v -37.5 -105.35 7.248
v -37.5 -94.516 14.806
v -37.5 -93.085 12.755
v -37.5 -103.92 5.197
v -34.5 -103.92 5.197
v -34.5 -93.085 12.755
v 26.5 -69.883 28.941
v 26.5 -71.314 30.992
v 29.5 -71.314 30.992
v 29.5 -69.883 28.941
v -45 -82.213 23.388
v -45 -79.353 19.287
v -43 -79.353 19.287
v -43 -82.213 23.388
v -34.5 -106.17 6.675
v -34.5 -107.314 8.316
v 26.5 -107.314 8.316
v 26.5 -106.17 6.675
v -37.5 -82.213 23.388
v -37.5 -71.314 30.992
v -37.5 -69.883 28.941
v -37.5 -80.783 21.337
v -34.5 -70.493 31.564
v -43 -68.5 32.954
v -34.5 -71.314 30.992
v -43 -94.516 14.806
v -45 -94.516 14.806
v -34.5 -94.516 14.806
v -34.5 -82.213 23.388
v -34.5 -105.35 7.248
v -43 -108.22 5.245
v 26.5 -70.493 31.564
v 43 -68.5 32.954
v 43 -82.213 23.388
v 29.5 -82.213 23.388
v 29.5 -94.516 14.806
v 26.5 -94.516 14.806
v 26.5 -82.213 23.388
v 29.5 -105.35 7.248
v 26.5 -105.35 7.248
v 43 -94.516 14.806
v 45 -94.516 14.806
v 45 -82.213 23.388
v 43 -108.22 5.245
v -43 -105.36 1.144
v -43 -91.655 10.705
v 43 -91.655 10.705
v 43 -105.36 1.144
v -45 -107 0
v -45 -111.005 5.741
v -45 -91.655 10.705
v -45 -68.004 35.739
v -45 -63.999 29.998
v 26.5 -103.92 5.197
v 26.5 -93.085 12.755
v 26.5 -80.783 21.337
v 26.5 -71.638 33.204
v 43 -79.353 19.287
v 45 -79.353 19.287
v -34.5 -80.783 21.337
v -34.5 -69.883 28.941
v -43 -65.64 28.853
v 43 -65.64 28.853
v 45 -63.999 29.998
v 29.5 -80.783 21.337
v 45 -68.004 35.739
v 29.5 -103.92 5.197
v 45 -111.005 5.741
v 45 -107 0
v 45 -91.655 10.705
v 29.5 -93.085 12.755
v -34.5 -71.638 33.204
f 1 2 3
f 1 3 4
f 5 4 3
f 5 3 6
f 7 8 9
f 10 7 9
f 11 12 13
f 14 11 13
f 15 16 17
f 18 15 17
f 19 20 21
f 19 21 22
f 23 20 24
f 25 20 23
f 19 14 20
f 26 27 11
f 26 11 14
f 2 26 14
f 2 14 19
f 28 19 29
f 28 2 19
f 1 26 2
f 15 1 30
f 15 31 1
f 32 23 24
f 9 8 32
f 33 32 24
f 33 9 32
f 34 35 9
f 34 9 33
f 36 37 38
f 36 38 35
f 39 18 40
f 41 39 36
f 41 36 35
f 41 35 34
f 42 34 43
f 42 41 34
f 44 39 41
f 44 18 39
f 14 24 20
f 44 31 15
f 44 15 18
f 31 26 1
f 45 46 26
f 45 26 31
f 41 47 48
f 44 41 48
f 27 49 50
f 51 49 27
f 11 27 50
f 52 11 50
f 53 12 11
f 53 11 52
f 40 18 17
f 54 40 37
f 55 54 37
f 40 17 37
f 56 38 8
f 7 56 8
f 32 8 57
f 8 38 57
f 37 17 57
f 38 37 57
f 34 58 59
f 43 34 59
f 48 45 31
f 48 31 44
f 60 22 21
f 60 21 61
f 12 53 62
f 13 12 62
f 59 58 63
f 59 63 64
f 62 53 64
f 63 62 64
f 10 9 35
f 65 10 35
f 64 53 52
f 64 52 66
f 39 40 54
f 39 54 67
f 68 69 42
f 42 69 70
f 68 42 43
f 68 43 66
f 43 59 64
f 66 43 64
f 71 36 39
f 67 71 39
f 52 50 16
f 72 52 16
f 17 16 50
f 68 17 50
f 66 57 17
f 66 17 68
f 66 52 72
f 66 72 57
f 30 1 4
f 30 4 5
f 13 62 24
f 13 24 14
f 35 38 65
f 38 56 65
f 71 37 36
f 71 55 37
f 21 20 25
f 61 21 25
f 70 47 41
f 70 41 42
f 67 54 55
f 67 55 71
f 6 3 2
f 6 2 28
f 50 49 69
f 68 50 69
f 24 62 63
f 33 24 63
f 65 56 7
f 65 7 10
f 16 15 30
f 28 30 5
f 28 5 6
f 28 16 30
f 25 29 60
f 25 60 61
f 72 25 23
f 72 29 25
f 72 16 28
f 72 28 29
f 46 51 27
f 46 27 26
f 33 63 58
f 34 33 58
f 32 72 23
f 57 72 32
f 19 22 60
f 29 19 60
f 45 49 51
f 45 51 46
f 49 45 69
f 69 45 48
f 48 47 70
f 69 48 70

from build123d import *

# Parameters (mm, degrees)
SKETCH019_W             = 90
SKETCH019_H             = 52.43
PAD008_DEPTH            = 7
SKETCH020_W             = 86
SKETCH020_H             = 48.43
POCKET010_DEPTH         = 5
SKETCH030_W             = 67
SKETCH030_H             = 41.5
PAD011_DEPTH            = 2.5
SKETCH021_W             = 61
SKETCH021_H             = 43.5
POCKET011_DEPTH         = 7.001
SKETCH029_W             = 90
SKETCH029_H             = 15
POCKET016_DEPTH         = 5
BODY001_PLACEMENT_ANGLE = 34.9


with BuildPart() as part:
    # Sketch019 → Pad008 (new body)
    with BuildSketch(Plane.XY):
        with Locations((0, 26.215)):
            Rectangle(SKETCH019_W, SKETCH019_H)
    extrude(amount=PAD008_DEPTH)

    # Sketch020 (on Face5 of Pad008) → Pocket010 (cut)
    with BuildSketch(Plane(origin=(0, 0, 0), x_dir=(1, 0, 0), z_dir=(0, 0, -1))):
        with Locations((0, -26.215)):
            Rectangle(SKETCH020_W, SKETCH020_H)
    extrude(amount=-POCKET010_DEPTH, mode=Mode.SUBTRACT)

    # Sketch030 (on Face11 of Pocket010) → Pad011 (join)
    with BuildSketch(Plane(origin=(0, 0, 5), x_dir=(1, 0, 0), z_dir=(0, 0, -1))):
        with Locations((-4, -26.25)):
            Rectangle(SKETCH030_W, SKETCH030_H)
    extrude(amount=PAD011_DEPTH)

    # Sketch021 (on Face5 of Pocket010) → Pocket011 (cut, through all)
    with BuildSketch(Plane.XY.offset(7)):
        with Locations((-4, 26.25)):
            Rectangle(SKETCH021_W, SKETCH021_H)
    extrude(amount=-POCKET011_DEPTH, mode=Mode.SUBTRACT)

    # Sketch029 (on Face4 of Pocket011) → Pocket016 (cut)
    with BuildSketch(Plane(origin=(0, 0, 0), x_dir=(1, 0, 0), z_dir=(0, 0, -1))):
        with Locations((0, -26.21)):
            Rectangle(SKETCH029_W, SKETCH029_H)
    extrude(amount=-POCKET016_DEPTH, mode=Mode.SUBTRACT)


with BuildPart() as part_1:
    # Body001 placement: moved
    add(part.part.moved(Location((0, -107, 0))).rotate(Axis((0, -107, 0), (1, 0, 0)), BODY001_PLACEMENT_ANGLE))


solid = part_1.part
